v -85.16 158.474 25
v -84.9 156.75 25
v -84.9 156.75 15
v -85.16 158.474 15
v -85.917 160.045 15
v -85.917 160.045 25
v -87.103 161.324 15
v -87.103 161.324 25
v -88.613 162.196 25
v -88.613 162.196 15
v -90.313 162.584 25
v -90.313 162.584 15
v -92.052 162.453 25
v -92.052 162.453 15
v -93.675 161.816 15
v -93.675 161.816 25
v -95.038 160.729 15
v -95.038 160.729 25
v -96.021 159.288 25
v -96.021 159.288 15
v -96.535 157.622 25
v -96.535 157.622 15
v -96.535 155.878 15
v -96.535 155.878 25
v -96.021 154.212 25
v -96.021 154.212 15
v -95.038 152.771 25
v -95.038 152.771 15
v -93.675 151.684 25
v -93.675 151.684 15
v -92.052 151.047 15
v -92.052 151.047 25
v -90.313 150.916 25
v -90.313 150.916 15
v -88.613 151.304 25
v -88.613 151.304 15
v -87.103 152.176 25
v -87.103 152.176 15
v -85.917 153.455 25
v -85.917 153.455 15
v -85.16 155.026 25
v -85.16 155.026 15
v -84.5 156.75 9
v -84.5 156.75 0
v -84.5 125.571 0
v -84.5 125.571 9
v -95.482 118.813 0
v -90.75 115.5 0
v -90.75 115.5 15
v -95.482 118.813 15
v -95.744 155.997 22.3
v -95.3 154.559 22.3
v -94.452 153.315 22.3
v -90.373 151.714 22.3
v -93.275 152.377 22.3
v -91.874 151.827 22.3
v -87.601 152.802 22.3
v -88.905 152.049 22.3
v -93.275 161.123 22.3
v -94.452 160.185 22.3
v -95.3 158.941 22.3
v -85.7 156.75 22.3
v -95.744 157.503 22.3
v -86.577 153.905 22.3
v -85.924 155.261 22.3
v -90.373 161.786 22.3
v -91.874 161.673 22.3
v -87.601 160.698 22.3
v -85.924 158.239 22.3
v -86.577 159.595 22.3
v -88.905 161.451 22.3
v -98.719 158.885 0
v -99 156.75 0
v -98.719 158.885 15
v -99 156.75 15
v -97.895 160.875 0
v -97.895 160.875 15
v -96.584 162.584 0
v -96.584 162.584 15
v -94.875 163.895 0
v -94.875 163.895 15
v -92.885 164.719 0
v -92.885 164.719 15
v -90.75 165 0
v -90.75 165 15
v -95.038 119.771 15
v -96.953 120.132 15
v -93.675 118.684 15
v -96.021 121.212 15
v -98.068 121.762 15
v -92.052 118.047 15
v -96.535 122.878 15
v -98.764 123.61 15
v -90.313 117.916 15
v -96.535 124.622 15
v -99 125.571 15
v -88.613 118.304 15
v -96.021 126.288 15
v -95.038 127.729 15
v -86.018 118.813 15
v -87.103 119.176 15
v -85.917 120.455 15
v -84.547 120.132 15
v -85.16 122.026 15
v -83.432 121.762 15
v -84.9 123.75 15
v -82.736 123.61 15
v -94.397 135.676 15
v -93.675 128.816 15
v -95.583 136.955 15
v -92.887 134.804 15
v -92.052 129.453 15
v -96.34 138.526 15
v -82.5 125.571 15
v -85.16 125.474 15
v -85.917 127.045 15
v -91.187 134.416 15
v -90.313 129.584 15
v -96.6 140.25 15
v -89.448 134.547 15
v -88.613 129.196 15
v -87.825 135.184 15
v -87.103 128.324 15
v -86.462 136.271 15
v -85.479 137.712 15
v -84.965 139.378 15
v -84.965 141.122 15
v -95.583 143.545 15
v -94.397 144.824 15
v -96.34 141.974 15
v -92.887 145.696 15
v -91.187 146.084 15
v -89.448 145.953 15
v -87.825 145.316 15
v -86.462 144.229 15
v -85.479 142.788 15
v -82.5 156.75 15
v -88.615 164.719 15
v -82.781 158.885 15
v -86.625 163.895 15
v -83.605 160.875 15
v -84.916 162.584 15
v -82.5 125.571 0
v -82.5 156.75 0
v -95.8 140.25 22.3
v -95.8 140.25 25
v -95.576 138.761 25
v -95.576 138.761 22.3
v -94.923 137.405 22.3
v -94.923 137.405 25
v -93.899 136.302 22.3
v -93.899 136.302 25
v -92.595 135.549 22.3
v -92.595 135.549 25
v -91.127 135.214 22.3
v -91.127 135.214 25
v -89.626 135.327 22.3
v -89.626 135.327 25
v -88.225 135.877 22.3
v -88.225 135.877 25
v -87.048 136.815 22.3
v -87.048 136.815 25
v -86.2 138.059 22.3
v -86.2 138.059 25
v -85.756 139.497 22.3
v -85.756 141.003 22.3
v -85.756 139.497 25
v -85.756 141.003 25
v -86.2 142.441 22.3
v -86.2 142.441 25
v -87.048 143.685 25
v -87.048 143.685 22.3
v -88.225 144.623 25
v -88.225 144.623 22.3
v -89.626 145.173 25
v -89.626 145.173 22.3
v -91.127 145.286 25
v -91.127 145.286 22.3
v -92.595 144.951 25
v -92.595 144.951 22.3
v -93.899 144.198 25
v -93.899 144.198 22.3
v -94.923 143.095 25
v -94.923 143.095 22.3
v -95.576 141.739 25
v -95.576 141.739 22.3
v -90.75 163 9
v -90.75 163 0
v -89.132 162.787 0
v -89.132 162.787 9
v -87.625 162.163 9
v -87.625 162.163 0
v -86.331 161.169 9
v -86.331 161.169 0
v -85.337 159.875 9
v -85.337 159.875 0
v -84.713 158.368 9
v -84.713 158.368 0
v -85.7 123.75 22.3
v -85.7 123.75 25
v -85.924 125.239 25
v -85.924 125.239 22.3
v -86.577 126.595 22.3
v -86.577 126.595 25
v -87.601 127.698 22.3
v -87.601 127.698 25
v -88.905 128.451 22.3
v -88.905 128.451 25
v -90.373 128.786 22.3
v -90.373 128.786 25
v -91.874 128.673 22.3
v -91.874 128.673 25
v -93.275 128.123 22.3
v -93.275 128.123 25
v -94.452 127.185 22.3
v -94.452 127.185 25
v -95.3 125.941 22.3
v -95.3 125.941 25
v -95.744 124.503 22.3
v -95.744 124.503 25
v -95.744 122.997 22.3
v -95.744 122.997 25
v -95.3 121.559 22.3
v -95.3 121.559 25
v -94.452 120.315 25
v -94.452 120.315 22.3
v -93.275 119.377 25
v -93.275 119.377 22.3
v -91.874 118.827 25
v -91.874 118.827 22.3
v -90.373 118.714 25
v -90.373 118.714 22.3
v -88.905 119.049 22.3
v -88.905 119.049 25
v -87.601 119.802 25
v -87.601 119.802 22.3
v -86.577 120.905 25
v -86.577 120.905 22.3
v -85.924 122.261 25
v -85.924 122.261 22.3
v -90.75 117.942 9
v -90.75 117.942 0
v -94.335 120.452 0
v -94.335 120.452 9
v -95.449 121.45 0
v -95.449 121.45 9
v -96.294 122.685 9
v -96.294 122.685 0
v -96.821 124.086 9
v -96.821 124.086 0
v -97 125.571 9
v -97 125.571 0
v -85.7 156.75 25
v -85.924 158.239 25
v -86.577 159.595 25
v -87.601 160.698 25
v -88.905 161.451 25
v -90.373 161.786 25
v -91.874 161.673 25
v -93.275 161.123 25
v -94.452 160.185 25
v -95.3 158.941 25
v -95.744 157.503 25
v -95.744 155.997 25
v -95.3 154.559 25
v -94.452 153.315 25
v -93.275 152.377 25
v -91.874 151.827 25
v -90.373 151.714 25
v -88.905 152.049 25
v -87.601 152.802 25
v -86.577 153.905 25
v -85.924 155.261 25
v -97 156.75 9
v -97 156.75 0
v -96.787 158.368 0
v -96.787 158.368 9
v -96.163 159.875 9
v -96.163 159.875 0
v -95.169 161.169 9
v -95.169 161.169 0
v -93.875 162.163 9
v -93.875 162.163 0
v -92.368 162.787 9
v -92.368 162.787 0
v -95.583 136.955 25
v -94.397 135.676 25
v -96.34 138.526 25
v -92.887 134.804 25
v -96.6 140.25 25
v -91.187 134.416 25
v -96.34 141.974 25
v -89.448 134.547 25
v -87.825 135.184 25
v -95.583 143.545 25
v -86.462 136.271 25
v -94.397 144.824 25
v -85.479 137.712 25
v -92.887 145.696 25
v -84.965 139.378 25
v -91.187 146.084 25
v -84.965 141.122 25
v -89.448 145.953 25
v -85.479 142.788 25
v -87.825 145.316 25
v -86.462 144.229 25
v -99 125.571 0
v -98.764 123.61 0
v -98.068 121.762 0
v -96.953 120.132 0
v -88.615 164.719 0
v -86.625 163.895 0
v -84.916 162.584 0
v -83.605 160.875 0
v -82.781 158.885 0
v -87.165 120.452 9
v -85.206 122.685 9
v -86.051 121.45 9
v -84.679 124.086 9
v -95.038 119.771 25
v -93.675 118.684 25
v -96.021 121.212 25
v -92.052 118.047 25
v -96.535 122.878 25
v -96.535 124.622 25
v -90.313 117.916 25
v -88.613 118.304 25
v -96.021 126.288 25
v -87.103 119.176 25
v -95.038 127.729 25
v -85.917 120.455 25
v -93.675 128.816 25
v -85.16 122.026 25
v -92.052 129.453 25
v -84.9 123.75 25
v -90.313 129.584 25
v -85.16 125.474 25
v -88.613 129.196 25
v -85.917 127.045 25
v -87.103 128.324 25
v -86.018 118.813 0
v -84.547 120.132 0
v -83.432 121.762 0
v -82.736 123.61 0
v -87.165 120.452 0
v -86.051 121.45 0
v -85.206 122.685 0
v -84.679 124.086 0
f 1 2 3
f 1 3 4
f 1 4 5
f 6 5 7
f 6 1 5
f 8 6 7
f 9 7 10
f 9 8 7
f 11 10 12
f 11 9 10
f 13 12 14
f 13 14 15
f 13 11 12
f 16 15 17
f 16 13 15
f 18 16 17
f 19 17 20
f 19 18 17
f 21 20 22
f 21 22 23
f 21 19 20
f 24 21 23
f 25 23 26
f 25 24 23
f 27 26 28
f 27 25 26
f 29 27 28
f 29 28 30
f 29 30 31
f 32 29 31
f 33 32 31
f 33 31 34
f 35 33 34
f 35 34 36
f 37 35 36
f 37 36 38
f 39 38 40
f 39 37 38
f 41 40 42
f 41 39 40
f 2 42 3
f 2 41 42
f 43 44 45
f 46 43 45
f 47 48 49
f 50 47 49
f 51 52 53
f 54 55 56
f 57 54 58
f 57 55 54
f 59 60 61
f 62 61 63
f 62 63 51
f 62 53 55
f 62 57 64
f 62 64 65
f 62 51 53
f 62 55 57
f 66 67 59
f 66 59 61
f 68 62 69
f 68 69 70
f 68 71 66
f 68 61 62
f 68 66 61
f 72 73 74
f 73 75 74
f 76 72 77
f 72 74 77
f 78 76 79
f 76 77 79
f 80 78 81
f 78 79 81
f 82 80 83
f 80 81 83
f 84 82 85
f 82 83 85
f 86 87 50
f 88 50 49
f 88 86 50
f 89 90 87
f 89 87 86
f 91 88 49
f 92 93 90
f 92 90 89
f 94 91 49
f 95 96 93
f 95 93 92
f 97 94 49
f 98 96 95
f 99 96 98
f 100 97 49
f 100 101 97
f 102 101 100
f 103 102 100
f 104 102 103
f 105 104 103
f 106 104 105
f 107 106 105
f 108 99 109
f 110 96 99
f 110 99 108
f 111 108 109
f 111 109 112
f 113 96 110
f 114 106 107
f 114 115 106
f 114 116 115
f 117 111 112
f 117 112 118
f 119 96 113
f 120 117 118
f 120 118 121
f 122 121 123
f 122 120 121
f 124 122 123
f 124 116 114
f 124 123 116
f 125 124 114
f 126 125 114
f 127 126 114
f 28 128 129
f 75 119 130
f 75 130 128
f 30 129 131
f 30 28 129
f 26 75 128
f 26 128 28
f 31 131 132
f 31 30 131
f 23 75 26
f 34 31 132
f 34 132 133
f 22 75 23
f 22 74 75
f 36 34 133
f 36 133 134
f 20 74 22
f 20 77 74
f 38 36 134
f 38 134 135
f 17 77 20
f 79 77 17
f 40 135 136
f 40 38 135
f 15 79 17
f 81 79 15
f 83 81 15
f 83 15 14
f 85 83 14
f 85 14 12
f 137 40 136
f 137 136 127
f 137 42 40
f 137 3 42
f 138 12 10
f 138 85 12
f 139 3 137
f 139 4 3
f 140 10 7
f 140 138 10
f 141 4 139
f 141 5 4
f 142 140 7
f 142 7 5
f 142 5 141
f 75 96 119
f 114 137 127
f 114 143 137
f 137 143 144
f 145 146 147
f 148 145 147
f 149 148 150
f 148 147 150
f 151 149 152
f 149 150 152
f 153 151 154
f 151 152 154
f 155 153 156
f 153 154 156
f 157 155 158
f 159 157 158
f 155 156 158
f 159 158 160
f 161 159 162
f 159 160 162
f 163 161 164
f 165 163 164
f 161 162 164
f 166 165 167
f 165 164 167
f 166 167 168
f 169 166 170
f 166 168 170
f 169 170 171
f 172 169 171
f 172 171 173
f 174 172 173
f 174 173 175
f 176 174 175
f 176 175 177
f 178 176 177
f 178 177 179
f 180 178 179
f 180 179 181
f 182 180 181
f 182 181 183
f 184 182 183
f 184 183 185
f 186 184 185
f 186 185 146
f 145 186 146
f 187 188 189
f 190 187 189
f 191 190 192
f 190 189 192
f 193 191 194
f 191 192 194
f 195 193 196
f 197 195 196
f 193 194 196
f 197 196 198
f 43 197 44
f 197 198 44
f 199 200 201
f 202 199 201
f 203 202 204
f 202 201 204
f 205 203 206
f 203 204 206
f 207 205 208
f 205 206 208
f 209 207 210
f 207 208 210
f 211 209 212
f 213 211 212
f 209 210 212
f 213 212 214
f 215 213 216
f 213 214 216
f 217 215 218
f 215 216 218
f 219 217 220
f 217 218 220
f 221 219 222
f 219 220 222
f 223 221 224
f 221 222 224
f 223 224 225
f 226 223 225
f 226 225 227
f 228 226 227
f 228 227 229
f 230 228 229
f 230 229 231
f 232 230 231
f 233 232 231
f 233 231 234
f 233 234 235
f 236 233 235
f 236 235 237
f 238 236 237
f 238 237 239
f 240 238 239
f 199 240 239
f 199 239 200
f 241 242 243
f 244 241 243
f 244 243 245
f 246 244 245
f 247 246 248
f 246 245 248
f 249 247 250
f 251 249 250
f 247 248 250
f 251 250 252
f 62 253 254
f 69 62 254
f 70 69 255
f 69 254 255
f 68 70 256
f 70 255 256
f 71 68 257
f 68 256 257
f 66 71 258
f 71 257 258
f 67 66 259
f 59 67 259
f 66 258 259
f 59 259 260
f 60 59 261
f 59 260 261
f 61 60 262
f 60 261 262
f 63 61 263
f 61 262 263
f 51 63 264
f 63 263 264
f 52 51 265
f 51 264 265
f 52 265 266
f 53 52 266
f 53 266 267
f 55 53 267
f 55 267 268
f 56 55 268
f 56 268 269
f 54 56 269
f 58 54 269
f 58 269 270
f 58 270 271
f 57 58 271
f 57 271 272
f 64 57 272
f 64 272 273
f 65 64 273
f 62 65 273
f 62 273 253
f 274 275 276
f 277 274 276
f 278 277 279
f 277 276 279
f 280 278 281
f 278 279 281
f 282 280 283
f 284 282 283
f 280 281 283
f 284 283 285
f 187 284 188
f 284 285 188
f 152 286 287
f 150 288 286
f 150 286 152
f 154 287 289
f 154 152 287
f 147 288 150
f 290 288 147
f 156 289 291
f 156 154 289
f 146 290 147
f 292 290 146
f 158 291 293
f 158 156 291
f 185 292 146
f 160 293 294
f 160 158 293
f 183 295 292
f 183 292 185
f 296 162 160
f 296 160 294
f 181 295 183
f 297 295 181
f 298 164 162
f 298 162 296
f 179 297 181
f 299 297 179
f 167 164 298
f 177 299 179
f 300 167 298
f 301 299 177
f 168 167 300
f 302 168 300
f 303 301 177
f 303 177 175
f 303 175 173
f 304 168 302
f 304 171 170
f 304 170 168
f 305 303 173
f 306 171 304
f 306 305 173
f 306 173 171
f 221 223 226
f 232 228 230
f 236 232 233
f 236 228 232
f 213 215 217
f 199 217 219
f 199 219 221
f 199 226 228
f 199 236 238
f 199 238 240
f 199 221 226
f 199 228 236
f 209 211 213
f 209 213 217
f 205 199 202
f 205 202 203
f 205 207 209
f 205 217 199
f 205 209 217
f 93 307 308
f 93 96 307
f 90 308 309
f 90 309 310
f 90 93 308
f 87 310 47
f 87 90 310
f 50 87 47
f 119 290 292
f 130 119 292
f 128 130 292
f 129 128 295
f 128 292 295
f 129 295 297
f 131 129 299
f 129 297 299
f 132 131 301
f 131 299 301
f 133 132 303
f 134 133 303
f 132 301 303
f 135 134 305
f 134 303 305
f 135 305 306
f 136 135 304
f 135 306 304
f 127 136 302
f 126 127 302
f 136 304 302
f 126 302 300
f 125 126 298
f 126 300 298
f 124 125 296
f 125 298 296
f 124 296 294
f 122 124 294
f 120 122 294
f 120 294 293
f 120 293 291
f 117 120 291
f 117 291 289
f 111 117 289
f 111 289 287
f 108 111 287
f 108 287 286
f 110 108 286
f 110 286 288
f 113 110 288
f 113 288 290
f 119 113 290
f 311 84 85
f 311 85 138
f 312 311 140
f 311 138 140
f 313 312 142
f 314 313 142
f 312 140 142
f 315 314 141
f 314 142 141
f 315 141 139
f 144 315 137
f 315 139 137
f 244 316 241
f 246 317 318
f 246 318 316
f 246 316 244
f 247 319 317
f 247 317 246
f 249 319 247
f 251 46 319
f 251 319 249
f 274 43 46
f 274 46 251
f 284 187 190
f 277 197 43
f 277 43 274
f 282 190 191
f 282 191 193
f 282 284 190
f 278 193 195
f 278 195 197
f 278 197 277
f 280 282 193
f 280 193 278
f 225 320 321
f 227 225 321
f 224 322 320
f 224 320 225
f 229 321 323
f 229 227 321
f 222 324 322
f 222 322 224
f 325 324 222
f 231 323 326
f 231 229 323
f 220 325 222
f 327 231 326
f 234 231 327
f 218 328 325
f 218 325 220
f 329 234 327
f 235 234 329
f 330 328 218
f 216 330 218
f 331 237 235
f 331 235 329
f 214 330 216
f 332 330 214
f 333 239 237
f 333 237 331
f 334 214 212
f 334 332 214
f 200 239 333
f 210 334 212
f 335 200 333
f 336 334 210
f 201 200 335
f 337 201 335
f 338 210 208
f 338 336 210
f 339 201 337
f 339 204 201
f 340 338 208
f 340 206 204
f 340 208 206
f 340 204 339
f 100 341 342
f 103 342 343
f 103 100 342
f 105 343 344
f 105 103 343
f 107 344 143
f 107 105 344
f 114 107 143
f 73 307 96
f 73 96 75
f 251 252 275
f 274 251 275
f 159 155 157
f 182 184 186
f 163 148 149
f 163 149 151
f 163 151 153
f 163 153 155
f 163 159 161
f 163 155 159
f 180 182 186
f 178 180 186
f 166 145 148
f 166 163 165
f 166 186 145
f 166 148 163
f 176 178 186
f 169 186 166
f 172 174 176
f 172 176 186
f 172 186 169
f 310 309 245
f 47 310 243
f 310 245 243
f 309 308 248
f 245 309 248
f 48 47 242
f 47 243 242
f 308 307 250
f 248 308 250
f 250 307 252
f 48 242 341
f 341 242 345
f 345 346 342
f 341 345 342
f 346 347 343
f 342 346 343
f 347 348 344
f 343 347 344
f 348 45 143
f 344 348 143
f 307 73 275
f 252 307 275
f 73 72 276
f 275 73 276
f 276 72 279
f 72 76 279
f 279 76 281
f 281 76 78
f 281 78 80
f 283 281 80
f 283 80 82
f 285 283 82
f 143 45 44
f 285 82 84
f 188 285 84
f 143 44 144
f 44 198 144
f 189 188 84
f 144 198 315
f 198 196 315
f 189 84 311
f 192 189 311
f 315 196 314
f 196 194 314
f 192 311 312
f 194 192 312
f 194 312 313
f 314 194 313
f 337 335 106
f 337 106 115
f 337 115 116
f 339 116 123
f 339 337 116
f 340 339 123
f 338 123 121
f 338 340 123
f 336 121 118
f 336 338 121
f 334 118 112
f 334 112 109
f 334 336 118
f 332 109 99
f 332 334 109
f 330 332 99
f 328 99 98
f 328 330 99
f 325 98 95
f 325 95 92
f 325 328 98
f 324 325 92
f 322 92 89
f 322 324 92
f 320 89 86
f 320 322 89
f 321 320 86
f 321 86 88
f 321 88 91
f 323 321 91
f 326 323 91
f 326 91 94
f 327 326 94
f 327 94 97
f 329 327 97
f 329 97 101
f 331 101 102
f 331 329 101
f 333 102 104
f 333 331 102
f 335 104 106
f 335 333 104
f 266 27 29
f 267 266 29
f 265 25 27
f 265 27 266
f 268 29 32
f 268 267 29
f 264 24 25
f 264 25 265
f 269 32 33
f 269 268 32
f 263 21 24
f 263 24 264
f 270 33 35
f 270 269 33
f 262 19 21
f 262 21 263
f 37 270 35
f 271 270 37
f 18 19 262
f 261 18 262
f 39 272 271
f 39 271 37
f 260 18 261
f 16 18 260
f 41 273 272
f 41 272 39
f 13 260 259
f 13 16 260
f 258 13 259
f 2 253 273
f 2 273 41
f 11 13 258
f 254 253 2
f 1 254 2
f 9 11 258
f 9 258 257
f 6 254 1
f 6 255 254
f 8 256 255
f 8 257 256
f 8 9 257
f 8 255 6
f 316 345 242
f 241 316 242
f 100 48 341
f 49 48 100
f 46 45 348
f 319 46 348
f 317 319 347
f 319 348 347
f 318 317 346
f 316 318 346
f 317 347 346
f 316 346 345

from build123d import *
from OCP.BRepFilletAPI import BRepFilletAPI_MakeChamfer

# Parameters (mm, degrees)
SKETCH1_W                       = 16.5
SKETCH1_H                       = 49.5
BOSS_EXTRUDE1_DEPTH             = 25
SKETCH2_R                       = 5.85
SKETCH2_R_2                     = 5.05
CUT_EXTRUDE1_DEPTH              = 10
FILLET5_R                       = 8.25
CHAMFER1_SIZE                   = 5.77671219
CHAMFER1_SIZE_2                 = 8.25
FILLET6_R                       = 8.25
SKETCH4_R                       = 5.1
BOSS_EXTRUDE2_DEPTH             = 7.3
SCHNITT_LINEAR_AUSTRAGEN1_DEPTH = 9


with BuildPart() as part:
    # Sketch1 → Boss-Extrude1 (new body)
    with BuildSketch(Plane.XY):
        with Locations((-90.75, 140.25)):
            Rectangle(SKETCH1_W, SKETCH1_H)
    extrude(amount=BOSS_EXTRUDE1_DEPTH)

    # Sketch2 → Cut-Extrude1 (cut)
    # profile 1 of 8: a face of its own
    with BuildSketch(Plane.XY.offset(25)):
        with BuildLine():
            ThreePointArc((-96.6, 140.25), (-90.75, 146.1), (-84.9, 140.25))
            Line((-84.9, 140.25), (-82.5, 140.25))
            Line((-82.5, 140.25), (-82.5, 165))
            Line((-82.5, 165), (-99, 165))
            Line((-99, 165), (-99, 140.25))
            Line((-99, 140.25), (-96.6, 140.25))
        make_face()
        with Locations((-90.75, 156.75)):
            Circle(SKETCH2_R, mode=Mode.SUBTRACT)
    # profile 2 of 8: a face of its own
    with BuildSketch(Plane.XY.offset(25)):
        with BuildLine():
            Line((-82.5, 140.25), (-84.9, 140.25))
            ThreePointArc((-84.9, 140.25), (-90.75, 134.4), (-96.6, 140.25))
            Line((-96.6, 140.25), (-99, 140.25))
            Line((-99, 140.25), (-99, 115.5))
            Line((-99, 115.5), (-82.5, 115.5))
            Line((-82.5, 115.5), (-82.5, 140.25))
        make_face()
        with Locations((-90.75, 123.75)):
            Circle(SKETCH2_R, mode=Mode.SUBTRACT)
    # profile 3 of 8: a face of its own
    with BuildSketch(Plane.XY.offset(25)):
        with BuildLine():
            ThreePointArc((-95.8, 140.25), (-90.75, 135.2), (-85.7, 140.25))
            Line((-85.7, 140.25), (-95.8, 140.25))
        make_face()
    # profile 4 of 8: a face of its own
    with BuildSketch(Plane.XY.offset(25)):
        with BuildLine():
            Line((-95.8, 140.25), (-85.7, 140.25))
            ThreePointArc((-85.7, 140.25), (-90.75, 145.3), (-95.8, 140.25))
        make_face()
    # profile 5 of 8: a face of its own
    with BuildSketch(Plane.XY.offset(25)):
        with BuildLine():
            ThreePointArc((-95.8, 140.25), (-90.75, 135.2), (-85.7, 140.25))
            Line((-85.7, 140.25), (-95.8, 140.25))
        make_face()
    # profile 6 of 8: a face of its own
    with BuildSketch(Plane.XY.offset(25)):
        with BuildLine():
            Line((-95.8, 140.25), (-85.7, 140.25))
            ThreePointArc((-85.7, 140.25), (-90.75, 145.3), (-95.8, 140.25))
        make_face()
    # profile 7 of 8: a face of its own
    with BuildSketch(Plane.XY.offset(25)):
        with Locations((-90.75, 123.75)):
            Circle(SKETCH2_R_2)
    # profile 8 of 8: a face of its own
    with BuildSketch(Plane.XY.offset(25)):
        with Locations((-90.75, 156.75)):
            Circle(SKETCH2_R_2)
    extrude(amount=-CUT_EXTRUDE1_DEPTH, mode=Mode.SUBTRACT)

    # Fillet5
    fillet5_edges = [part.edges().sort_by_distance(p)[0] for p in [
        (-82.5, 165, 7.5),
        (-99, 165, 7.5),
    ]]
    fillet(fillet5_edges, radius=FILLET5_R - 0.0001)  # a hair under: the kernel refuses the full size

    # Chamfer1
    chamfer1_edges_1 = [part.edges().sort_by_distance(p)[0] for p in [
        (-99, 115.5, 7.5),
    ]]
    chamfer1_side_1 = [part.faces().sort_by_distance(p)[0] for p in [
        (-99, 115.615534244, 7.5),
    ]]
    chamfer1_edges_2 = [part.edges().sort_by_distance(p)[0] for p in [
        (-82.5, 115.5, 7.5),
    ]]
    chamfer1_side_2 = [part.faces().sort_by_distance(p)[0] for p in [
        (-82.5, 115.615534244, 7.5),
    ]]
    chamfer1 = BRepFilletAPI_MakeChamfer(part.part.solid().wrapped)
    for e in chamfer1_edges_1:
        chamfer1.Add(CHAMFER1_SIZE - 0.0001, CHAMFER1_SIZE_2 - 0.0001, e.wrapped, chamfer1_side_1[0].wrapped)
    for e in chamfer1_edges_2:
        chamfer1.Add(CHAMFER1_SIZE - 0.0001, CHAMFER1_SIZE_2 - 0.0001, e.wrapped, chamfer1_side_2[0].wrapped)
    add(Compound.cast(chamfer1.Shape()), mode=Mode.REPLACE)  # a hair under: the kernel refuses the full size

    # Fillet6
    fillet6_edges = [part.edges().sort_by_distance(p)[0] for p in [
        (-99, 121.27661219, 7.5),
        (-82.5, 121.27661219, 7.5),
    ]]
    fillet(fillet6_edges, radius=FILLET6_R)

    # Sketch4 → Boss-Extrude2 (add)
    with BuildSketch(Plane.XY.offset(15)):
        with Locations((-90.75, 156.75)):
            Circle(SKETCH4_R)
        with Locations((-90.75, 140.25)):
            Circle(SKETCH4_R)
        with Locations((-90.75, 123.75)):
            Circle(SKETCH4_R)
    extrude(amount=BOSS_EXTRUDE2_DEPTH)

    # Skizze2 → Schnitt-Linear austragen1 (cut)
    with BuildSketch(Plane(origin=(0, 0, 0), x_dir=(-1, 0, 0), z_dir=(0, 0, -1))):
        with BuildLine():
            Line((84.5, 156.75), (84.5, 125.571390357))
            ThreePointArc((84.5, 125.571390357), (85.206182293, 122.685461525), (87.165147273, 120.45169008))
            Line((87.165147273, 120.45169008), (90.75, 117.941549178))
            Line((90.75, 117.941549178), (94.334852727, 120.45169008))
            ThreePointArc((94.334852727, 120.45169008), (96.293817707, 122.685461525), (97, 125.571390357))
            Line((97, 125.571390357), (97, 156.75))
            ThreePointArc((97, 156.75), (95.169417382, 161.169417382), (90.75, 163))
            ThreePointArc((90.75, 163), (86.330582618, 161.169417382), (84.5, 156.75))
        make_face()
    extrude(amount=-SCHNITT_LINEAR_AUSTRAGEN1_DEPTH, mode=Mode.SUBTRACT)


solid = part.part
